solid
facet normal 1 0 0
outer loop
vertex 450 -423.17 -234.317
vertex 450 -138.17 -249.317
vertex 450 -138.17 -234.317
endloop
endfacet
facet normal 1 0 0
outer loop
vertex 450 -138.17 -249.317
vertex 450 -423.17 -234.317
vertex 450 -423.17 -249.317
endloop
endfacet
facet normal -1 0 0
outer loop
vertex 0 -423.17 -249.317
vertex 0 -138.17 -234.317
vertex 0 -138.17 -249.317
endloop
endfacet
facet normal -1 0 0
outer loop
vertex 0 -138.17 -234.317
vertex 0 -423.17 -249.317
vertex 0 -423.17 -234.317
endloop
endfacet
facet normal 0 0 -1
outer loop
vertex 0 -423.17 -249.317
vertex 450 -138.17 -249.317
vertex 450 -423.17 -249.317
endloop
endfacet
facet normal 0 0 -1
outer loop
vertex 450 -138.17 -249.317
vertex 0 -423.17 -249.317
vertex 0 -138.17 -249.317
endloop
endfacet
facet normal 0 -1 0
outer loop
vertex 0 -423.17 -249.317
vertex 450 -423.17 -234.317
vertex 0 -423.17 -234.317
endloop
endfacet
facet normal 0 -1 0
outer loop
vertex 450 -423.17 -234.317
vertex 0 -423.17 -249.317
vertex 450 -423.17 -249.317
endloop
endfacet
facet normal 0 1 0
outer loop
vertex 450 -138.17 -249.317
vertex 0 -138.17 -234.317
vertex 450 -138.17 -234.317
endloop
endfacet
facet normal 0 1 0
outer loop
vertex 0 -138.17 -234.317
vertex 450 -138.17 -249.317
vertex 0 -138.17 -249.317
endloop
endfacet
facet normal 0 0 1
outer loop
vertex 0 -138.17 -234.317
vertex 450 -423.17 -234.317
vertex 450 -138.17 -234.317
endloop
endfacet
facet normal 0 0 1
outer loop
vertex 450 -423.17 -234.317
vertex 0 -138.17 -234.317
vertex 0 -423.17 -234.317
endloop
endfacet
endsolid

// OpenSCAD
// file: time_utility.scad
// Utility functions to help manage time steps $t
// 2017/04/28 - Roger Cheng

// Returns 0-1 for the portion of time between start/end.
function timeRanged(start, current, end) = 
    current<=start? 0 : 
        (current>=end ? 1 : 
            ((current-start)/(end-start)));

// Symmetric animation 0 to 1 to 0 while $t goes 0 to 1
function timeSymmetric() = abs($t-0.5)*2;

// A little padding on either end of timeSymmetric()
padStart=0.1;
padEnd=0.9;
function timePadded() = timeRanged(padStart, timeSymmetric(), padEnd);
// main file
// Baseline triple-panel design as per Arnold Garcia
//
// This is an OpenSCAD project that visualizes the movement of Arnold
// Garcia's triple-panel design.
//
// 2017/05/01 - Roger Cheng

use <time_utility.scad>

// Time ranges for animation

function scrRotate() = timeRanged(0, timePadded(), 0.5);

function scrFlip() = timeRanged(0.5, timePadded(), 1.0);


// Physical construction

screenW = 450;
screenH = 285;
screenD = 5;

module screen()
{
    cube([screenW, screenH, screenD]);
}

module center()
{
    // Center screen sits at default location.
    screen();
}

module left()
{
    // Rotate on hinge between center/left
    rotate([0, -180*scrRotate(), 0])
    
    // Translate for hinge between center/left
    translate([-screenW, 0, 0])
    
    // One instance of screen
    screen();
}

module right()
{
    // Translate back to intended position relative to center
    translate([screenW,0, screenD])
    
    // Rotate on hinge between center/right
    rotate([0, -180*scrRotate(), 0])
    
    // Translate for hinge between center/right
    translate([0, 0, -screenD])
    
    // One instance of screen
    screen();
}

module screenAssembly()
{
    // Translate+Rotate back to proper world location
    rotate([-120, 0, 0])
    translate([screenW/2, screenH, screenD])
    
    // Rotate for screen closing
    rotate([120*scrFlip(), 0, 0])
    
    // Translate for screen assembly hinge
    translate([-screenW/2, -screenH, screenD])
    {
        left();
        center();
        right();
    }
}


screenAssembly();
